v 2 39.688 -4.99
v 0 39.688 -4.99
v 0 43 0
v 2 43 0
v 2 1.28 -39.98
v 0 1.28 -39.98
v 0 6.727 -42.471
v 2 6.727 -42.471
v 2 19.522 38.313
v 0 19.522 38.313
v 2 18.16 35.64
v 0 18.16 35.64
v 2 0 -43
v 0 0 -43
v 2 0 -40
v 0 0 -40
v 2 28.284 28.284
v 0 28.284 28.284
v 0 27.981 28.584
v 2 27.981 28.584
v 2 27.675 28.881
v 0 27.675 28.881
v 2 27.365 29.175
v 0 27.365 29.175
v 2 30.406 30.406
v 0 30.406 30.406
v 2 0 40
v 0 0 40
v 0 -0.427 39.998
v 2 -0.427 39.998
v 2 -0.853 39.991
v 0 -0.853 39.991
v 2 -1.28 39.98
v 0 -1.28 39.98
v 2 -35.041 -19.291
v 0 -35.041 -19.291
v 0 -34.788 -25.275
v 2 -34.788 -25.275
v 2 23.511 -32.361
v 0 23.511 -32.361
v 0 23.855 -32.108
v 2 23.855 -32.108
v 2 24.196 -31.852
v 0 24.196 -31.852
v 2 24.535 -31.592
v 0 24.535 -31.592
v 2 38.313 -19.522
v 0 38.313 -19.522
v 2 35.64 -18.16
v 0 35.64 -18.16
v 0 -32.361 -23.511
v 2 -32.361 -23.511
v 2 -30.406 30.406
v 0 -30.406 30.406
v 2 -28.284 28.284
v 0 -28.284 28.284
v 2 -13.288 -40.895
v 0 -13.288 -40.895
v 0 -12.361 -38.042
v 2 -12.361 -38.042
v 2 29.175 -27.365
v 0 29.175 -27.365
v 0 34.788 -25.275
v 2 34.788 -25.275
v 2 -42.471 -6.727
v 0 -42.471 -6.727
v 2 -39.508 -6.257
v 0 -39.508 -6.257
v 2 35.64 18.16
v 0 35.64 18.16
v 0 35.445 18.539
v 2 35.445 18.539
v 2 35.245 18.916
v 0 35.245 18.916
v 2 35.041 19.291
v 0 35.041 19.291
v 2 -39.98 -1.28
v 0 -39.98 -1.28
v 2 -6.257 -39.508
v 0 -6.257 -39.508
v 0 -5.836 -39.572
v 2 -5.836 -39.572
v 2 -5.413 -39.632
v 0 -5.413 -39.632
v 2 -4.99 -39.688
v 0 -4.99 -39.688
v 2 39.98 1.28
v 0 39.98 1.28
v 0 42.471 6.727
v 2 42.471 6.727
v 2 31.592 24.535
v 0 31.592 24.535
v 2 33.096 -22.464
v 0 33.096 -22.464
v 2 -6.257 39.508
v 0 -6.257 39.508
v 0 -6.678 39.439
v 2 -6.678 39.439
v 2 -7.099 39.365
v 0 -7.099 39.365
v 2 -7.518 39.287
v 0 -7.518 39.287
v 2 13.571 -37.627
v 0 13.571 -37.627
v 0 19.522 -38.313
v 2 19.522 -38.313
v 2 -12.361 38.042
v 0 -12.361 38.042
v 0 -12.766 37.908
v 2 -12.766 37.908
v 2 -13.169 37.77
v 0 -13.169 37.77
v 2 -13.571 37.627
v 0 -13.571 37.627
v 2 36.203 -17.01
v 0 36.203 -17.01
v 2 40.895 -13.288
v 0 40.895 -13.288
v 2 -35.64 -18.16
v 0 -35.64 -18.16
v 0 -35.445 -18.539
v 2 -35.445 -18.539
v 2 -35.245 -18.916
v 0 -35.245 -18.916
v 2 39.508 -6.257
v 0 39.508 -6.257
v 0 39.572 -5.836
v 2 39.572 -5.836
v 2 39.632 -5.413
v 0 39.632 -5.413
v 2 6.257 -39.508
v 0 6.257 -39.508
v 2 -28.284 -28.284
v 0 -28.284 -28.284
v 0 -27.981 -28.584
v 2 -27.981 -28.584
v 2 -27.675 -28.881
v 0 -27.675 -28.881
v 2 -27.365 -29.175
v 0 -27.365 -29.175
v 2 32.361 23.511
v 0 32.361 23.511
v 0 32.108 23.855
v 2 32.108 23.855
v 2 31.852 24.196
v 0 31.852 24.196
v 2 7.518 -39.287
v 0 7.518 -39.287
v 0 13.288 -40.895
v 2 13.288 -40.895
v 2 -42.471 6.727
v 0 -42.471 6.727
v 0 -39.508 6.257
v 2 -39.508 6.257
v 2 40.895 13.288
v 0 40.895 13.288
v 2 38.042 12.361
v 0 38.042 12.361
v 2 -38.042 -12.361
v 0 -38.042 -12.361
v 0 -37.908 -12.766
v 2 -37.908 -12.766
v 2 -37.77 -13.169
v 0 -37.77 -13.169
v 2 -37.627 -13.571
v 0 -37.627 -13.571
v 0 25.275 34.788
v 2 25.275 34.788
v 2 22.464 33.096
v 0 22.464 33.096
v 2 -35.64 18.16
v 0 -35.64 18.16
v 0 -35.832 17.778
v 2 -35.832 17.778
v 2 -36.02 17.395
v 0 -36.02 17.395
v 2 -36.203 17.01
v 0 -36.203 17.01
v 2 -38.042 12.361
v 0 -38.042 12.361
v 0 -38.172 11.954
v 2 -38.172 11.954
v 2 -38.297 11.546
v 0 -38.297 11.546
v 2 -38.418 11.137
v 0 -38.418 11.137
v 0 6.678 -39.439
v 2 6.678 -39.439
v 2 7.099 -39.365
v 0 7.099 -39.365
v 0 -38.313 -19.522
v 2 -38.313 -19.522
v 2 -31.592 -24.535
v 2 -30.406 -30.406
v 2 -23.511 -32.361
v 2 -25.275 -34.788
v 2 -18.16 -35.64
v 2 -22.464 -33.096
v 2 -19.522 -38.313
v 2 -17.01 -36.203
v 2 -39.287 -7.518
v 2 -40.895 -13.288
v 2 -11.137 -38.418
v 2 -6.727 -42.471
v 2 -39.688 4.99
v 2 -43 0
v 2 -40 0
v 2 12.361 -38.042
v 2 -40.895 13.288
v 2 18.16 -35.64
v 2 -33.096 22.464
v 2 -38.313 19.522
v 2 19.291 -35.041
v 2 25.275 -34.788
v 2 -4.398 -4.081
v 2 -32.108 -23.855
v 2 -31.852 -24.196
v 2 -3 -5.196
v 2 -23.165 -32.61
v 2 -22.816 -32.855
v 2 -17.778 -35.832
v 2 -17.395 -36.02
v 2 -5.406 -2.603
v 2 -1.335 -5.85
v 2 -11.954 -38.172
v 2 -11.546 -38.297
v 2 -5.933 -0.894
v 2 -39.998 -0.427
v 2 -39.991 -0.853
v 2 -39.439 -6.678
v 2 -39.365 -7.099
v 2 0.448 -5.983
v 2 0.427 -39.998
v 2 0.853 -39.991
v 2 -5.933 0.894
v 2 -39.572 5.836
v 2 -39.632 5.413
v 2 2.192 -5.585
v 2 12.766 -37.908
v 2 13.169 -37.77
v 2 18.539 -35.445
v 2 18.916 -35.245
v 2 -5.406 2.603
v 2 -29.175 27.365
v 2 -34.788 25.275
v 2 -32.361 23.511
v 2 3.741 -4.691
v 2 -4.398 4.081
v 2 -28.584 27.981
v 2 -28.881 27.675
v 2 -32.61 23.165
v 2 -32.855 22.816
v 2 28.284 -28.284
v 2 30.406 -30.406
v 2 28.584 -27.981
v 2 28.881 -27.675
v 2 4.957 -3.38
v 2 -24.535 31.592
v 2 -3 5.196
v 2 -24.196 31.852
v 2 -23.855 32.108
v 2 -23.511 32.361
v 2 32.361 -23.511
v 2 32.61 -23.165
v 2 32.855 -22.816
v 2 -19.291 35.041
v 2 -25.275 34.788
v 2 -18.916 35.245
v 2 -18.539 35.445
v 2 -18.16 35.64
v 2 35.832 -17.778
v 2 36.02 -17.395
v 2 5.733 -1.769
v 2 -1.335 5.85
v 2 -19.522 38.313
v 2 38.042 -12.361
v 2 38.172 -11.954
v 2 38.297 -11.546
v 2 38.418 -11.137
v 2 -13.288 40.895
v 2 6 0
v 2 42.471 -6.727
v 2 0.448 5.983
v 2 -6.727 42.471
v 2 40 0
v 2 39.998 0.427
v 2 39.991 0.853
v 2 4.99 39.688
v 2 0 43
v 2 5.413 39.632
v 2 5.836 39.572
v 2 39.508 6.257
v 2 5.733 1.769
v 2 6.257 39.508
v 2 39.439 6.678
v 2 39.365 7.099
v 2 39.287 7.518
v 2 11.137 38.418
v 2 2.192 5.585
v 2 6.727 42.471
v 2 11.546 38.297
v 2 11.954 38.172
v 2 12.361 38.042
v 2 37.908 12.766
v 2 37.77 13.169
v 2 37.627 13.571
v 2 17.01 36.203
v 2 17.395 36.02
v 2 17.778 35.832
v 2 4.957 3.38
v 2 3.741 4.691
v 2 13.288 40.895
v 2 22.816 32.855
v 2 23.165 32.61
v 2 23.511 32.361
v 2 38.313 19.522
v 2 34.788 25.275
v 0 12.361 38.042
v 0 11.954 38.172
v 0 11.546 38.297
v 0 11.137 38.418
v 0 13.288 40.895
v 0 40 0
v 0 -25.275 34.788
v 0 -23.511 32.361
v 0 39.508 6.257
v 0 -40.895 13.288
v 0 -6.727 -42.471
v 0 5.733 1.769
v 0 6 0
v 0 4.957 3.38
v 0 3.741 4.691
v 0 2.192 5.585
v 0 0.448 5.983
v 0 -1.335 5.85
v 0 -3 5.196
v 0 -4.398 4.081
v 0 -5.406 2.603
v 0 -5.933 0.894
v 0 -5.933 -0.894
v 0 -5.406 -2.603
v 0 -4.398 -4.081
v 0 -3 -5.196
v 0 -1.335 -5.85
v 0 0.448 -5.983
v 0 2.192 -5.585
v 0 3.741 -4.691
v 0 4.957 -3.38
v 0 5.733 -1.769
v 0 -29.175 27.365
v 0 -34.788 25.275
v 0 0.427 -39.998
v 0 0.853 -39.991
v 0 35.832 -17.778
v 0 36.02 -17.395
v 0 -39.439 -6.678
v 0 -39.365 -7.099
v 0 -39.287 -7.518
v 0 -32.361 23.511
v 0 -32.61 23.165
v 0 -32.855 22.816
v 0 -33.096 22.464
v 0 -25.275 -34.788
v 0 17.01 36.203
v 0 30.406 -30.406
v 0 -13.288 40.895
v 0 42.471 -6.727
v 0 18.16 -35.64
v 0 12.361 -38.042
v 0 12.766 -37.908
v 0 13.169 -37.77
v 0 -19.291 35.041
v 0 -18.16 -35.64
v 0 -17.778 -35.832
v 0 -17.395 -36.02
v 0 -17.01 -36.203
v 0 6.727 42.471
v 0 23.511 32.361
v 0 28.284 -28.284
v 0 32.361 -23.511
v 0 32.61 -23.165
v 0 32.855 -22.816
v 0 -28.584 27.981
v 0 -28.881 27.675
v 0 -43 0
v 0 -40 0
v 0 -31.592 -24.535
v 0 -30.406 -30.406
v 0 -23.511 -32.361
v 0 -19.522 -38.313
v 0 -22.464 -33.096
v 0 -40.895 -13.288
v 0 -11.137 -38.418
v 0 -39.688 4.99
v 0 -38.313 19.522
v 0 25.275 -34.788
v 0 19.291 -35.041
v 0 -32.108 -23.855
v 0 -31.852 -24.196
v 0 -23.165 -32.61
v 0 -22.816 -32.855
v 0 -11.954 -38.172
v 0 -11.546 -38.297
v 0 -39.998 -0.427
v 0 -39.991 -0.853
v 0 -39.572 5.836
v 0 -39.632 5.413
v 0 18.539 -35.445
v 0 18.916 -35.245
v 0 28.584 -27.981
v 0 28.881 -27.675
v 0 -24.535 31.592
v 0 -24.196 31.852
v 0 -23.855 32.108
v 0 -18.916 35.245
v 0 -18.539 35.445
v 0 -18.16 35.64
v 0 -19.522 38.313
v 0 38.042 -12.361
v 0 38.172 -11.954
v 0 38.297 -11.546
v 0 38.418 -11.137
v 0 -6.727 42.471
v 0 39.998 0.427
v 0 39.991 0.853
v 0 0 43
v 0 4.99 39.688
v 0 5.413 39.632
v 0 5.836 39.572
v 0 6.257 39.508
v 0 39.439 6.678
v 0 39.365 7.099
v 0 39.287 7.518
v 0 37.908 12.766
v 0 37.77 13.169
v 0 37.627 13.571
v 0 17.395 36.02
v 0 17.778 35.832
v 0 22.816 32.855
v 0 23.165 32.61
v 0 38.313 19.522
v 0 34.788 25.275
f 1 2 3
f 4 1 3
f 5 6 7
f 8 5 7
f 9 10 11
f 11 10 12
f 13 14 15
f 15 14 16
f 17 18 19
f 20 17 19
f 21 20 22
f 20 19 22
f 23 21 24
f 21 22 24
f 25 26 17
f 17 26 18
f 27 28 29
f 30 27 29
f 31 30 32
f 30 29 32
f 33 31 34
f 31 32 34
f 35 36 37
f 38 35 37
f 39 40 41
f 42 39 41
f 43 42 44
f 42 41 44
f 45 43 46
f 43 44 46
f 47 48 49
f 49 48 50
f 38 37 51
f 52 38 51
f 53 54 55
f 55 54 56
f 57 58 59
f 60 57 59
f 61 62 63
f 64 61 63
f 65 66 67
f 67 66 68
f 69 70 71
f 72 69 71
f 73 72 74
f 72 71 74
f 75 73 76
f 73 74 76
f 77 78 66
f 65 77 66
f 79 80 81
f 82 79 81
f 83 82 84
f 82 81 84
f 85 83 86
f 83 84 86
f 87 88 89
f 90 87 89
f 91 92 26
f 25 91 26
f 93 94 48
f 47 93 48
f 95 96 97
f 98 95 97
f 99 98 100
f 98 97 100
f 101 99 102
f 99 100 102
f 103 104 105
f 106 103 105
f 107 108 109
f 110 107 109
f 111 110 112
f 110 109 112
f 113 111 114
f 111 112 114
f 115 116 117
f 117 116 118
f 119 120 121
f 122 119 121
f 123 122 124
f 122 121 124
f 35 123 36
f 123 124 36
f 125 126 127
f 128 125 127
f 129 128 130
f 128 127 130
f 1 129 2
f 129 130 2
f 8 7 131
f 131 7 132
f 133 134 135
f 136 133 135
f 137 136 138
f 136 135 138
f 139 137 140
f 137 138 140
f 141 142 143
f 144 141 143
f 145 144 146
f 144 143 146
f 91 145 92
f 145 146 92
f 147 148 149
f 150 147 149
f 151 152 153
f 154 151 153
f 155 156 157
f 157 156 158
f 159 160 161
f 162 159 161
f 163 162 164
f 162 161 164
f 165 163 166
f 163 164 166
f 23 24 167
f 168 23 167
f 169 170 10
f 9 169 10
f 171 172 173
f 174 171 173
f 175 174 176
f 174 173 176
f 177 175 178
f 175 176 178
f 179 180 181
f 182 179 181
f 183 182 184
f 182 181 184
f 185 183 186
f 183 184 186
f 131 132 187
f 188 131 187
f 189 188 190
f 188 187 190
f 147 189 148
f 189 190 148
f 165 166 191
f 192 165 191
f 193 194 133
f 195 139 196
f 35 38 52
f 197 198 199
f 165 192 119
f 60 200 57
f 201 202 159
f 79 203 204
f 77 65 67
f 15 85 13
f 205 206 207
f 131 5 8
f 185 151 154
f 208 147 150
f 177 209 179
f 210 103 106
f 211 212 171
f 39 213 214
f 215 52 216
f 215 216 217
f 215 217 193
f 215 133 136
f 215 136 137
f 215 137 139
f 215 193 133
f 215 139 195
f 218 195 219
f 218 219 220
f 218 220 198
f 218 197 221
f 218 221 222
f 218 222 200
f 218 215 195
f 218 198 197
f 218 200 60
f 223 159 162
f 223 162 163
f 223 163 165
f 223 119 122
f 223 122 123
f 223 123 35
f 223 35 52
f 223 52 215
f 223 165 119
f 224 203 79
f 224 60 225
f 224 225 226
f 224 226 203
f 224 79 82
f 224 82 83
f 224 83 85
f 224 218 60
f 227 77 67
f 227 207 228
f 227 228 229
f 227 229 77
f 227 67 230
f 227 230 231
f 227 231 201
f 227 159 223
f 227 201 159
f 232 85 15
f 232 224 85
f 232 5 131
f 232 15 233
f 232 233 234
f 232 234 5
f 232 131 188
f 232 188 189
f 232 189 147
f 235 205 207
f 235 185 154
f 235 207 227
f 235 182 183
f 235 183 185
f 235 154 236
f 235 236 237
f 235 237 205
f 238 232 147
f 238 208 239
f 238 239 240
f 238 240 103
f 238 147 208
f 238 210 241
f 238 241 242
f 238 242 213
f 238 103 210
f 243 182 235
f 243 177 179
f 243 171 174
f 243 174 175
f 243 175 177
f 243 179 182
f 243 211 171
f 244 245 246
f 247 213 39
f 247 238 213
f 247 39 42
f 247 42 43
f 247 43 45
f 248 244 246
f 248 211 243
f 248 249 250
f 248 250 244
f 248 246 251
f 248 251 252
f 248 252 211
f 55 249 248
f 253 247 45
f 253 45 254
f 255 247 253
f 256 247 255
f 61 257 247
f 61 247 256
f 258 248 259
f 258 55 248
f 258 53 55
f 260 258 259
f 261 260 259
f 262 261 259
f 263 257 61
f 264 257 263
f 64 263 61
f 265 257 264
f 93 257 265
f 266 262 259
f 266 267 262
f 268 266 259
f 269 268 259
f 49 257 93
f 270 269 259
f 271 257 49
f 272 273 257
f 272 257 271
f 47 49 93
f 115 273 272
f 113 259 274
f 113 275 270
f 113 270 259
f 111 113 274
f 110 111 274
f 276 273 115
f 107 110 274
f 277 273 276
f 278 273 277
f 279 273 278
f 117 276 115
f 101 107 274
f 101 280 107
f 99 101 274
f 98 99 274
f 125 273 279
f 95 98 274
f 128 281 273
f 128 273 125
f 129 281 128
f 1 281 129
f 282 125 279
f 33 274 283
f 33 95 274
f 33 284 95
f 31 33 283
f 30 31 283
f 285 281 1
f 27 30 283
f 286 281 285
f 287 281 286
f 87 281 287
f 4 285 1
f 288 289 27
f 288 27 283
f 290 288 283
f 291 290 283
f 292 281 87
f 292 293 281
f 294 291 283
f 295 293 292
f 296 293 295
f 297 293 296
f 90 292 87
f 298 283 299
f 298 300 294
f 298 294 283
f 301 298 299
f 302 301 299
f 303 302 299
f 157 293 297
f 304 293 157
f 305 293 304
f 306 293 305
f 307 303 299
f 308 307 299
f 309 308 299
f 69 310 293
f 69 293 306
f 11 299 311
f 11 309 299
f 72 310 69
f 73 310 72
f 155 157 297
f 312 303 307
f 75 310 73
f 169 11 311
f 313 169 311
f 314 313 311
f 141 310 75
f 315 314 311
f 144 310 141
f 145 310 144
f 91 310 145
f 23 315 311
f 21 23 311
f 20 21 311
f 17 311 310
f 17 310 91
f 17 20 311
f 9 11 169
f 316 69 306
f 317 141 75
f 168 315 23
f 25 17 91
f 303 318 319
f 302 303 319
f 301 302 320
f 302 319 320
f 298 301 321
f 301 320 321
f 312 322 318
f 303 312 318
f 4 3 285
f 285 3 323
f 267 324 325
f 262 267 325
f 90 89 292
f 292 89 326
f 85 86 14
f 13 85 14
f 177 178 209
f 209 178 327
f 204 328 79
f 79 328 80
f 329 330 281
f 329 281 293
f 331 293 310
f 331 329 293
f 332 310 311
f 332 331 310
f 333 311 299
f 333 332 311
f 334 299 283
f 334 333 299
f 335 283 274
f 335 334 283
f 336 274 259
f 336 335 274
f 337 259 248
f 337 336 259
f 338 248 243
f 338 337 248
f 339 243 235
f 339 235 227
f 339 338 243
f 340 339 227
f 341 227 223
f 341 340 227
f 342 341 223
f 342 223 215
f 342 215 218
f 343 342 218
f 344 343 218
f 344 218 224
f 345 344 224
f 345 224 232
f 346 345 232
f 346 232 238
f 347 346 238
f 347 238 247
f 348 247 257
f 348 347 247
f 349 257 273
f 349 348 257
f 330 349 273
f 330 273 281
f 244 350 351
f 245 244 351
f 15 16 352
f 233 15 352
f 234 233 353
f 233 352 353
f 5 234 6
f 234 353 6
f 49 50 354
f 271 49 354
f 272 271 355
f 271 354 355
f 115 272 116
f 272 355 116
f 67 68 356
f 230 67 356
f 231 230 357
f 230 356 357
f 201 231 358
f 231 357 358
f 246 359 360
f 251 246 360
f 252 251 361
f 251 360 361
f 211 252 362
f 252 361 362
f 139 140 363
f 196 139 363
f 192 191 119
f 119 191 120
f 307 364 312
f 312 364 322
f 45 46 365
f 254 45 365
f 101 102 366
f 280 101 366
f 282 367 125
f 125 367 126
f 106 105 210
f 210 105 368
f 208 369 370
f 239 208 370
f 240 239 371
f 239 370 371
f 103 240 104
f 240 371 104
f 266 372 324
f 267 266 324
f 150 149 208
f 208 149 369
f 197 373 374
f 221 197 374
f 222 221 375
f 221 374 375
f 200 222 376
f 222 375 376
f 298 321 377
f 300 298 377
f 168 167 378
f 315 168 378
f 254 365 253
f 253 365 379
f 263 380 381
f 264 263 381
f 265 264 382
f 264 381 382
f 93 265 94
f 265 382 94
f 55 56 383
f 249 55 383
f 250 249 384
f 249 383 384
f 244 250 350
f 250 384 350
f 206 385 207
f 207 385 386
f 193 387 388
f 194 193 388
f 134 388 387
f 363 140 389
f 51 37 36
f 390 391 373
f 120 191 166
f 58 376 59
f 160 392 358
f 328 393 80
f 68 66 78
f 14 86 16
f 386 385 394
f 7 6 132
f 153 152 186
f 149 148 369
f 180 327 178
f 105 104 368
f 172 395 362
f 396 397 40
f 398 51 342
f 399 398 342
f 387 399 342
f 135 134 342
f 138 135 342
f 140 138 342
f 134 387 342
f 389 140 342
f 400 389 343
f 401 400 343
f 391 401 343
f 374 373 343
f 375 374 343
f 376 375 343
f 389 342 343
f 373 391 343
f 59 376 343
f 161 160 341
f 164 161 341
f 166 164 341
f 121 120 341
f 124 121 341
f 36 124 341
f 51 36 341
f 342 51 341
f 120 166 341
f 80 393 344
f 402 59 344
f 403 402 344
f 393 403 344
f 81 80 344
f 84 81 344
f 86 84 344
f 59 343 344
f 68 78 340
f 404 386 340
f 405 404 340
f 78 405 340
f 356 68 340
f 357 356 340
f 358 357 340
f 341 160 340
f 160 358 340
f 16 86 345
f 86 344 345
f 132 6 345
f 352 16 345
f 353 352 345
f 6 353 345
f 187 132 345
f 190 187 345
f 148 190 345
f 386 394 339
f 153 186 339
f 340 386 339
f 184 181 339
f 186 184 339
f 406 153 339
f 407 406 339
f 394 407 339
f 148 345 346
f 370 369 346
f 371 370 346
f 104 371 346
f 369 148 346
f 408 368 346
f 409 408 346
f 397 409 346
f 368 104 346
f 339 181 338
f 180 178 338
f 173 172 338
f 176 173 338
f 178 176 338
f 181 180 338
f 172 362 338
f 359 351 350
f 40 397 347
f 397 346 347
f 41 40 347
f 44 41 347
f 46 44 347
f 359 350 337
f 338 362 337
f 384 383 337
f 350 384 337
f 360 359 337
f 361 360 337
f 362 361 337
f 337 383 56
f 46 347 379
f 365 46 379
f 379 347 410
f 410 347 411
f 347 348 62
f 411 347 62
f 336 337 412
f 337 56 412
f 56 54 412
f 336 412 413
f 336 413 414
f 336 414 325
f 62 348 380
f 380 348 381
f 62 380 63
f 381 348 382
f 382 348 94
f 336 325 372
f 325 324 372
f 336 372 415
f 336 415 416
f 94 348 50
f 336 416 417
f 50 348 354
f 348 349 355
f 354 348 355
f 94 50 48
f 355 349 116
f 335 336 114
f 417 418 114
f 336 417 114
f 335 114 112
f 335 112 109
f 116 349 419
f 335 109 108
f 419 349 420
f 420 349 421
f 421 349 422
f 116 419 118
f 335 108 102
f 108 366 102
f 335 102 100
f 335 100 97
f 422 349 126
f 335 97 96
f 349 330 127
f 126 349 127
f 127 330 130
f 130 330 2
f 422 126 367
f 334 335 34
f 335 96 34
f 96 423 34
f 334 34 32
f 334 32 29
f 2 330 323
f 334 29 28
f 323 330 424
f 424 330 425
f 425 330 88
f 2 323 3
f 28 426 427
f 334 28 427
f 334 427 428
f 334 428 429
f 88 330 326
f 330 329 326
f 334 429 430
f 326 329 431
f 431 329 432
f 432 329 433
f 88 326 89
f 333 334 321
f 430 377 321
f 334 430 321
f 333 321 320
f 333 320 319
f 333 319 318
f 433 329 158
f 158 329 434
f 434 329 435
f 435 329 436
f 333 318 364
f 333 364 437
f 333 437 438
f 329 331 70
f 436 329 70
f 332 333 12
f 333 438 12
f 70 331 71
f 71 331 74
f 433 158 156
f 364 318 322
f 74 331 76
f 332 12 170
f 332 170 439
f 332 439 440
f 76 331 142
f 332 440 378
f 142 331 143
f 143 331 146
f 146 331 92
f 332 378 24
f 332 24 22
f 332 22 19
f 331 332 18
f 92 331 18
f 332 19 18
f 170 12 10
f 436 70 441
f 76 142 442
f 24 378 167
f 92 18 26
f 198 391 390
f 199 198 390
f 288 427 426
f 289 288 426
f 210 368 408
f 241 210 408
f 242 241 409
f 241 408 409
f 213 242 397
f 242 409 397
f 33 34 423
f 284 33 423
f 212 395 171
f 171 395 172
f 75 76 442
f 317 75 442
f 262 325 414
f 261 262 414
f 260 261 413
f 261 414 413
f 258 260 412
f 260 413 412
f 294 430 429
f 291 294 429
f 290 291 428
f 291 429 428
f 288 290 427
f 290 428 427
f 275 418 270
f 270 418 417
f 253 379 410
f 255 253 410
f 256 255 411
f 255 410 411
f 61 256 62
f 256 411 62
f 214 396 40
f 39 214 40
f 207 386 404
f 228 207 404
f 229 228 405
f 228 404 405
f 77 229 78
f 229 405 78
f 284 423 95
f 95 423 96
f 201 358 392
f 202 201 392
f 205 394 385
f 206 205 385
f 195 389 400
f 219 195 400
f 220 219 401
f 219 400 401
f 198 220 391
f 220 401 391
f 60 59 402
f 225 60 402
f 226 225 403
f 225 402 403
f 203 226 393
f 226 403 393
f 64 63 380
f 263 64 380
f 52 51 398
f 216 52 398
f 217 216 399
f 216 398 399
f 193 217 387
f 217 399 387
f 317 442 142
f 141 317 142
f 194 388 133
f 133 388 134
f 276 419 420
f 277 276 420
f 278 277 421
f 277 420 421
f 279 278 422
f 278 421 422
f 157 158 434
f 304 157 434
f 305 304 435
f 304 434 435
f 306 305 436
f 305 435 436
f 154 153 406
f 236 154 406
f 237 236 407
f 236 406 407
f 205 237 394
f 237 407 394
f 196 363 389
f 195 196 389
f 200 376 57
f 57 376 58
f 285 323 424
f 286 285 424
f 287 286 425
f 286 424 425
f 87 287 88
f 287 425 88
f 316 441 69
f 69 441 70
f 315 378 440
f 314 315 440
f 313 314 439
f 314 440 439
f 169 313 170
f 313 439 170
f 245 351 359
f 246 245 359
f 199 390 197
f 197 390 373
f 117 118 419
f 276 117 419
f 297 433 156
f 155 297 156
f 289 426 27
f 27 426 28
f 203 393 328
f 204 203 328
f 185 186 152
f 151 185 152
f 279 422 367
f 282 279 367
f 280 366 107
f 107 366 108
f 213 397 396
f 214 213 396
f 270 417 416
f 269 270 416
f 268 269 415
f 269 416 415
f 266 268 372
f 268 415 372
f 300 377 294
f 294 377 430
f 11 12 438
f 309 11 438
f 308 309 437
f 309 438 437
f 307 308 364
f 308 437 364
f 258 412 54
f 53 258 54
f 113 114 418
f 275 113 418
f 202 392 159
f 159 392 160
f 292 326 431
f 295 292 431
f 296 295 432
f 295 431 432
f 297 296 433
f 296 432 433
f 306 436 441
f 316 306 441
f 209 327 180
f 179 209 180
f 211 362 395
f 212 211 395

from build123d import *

# Parameters (mm, degrees)
F0_R     = 6
F1_DEPTH = 2


with BuildPart() as f1:
    # F0 (on Right) → F1 (new body)
    with BuildSketch(Plane.YZ):
        with BuildLine():
            ThreePointArc((39.6875, -4.990225), (39.921799, -2.5), (40, 0))
            ThreePointArc((40, 0), (39.994881, 0.639935), (39.979524, 1.279706))
            ThreePointArc((39.979524, 1.279706), (39.821381, 3.775924), (39.507534, 6.257379))
            ThreePointArc((39.507534, 6.257379), (39.402369, 6.888634), (39.28712, 7.518126))
            ThreePointArc((39.28712, 7.518126), (38.740429, 9.958873), (38.042261, 12.36068))
            ThreePointArc((38.042261, 12.36068), (37.839641, 12.967712), (37.627336, 13.571425))
            ThreePointArc((37.627336, 13.571425), (36.705559, 15.896601), (35.640261, 18.15962))
            ThreePointArc((35.640261, 18.15962), (35.345175, 18.727482), (35.041043, 19.290551))
            ThreePointArc((35.041043, 19.290551), (33.766877, 21.442902), (32.36068, 23.51141))
            ThreePointArc((32.36068, 23.51141), (31.980394, 24.026119), (31.591922, 24.534679))
            ThreePointArc((31.591922, 24.534679), (29.996741, 26.461208), (28.284271, 28.284271))
            ThreePointArc((28.284271, 28.284271), (27.828149, 28.733154), (27.364904, 29.174681))
            ThreePointArc((27.364904, 29.174681), (25.487987, 30.82795), (23.51141, 32.36068))
            ThreePointArc((23.51141, 32.36068), (22.990683, 32.732682), (22.464071, 33.096307))
            ThreePointArc((22.464071, 33.096307), (20.351634, 34.435607), (18.15962, 35.640261))
            ThreePointArc((18.15962, 35.640261), (17.58711, 35.926224), (17.010098, 36.202991))
            ThreePointArc((17.010098, 36.202991), (14.714155, 37.195344), (12.36068, 38.042261))
            ThreePointArc((12.36068, 38.042261), (11.750484, 38.235143), (11.13728, 38.418238))
            ThreePointArc((11.13728, 38.418238), (8.714366, 39.039209), (6.257379, 39.507534))
            ThreePointArc((6.257379, 39.507534), (5.624522, 39.602585), (4.990225, 39.6875))
            ThreePointArc((4.990225, 39.6875), (2.5, 39.921799), (0, 40))
            ThreePointArc((0, 40), (-0.639935, 39.994881), (-1.279706, 39.979524))
            ThreePointArc((-1.279706, 39.979524), (-3.775924, 39.821381), (-6.257379, 39.507534))
            ThreePointArc((-6.257379, 39.507534), (-6.888634, 39.402369), (-7.518126, 39.28712))
            ThreePointArc((-7.518126, 39.28712), (-9.958873, 38.740429), (-12.36068, 38.042261))
            ThreePointArc((-12.36068, 38.042261), (-12.967712, 37.839641), (-13.571425, 37.627336))
            ThreePointArc((-13.571425, 37.627336), (-15.896601, 36.705559), (-18.15962, 35.640261))
            ThreePointArc((-18.15962, 35.640261), (-18.727482, 35.345175), (-19.290551, 35.041043))
            ThreePointArc((-19.290551, 35.041043), (-21.442902, 33.766877), (-23.51141, 32.36068))
            ThreePointArc((-23.51141, 32.36068), (-24.026119, 31.980394), (-24.534679, 31.591922))
            ThreePointArc((-24.534679, 31.591922), (-26.461208, 29.996741), (-28.284271, 28.284271))
            ThreePointArc((-28.284271, 28.284271), (-28.733154, 27.828149), (-29.174681, 27.364904))
            ThreePointArc((-29.174681, 27.364904), (-30.82795, 25.487987), (-32.36068, 23.51141))
            ThreePointArc((-32.36068, 23.51141), (-32.732682, 22.990683), (-33.096307, 22.464071))
            ThreePointArc((-33.096307, 22.464071), (-34.435607, 20.351634), (-35.640261, 18.15962))
            ThreePointArc((-35.640261, 18.15962), (-35.926224, 17.58711), (-36.202991, 17.010098))
            ThreePointArc((-36.202991, 17.010098), (-37.195344, 14.714155), (-38.042261, 12.36068))
            ThreePointArc((-38.042261, 12.36068), (-38.235143, 11.750484), (-38.418238, 11.13728))
            ThreePointArc((-38.418238, 11.13728), (-39.039209, 8.714366), (-39.507534, 6.257379))
            ThreePointArc((-39.507534, 6.257379), (-39.602585, 5.624522), (-39.6875, 4.990225))
            ThreePointArc((-39.6875, 4.990225), (-39.921799, 2.5), (-40, 0))
            ThreePointArc((-40, 0), (-39.994881, -0.639935), (-39.979524, -1.279706))
            ThreePointArc((-39.979524, -1.279706), (-39.821381, -3.775924), (-39.507534, -6.257379))
            ThreePointArc((-39.507534, -6.257379), (-39.402369, -6.888634), (-39.28712, -7.518126))
            ThreePointArc((-39.28712, -7.518126), (-38.740429, -9.958873), (-38.042261, -12.36068))
            ThreePointArc((-38.042261, -12.36068), (-37.839641, -12.967712), (-37.627336, -13.571425))
            ThreePointArc((-37.627336, -13.571425), (-36.705559, -15.896601), (-35.640261, -18.15962))
            ThreePointArc((-35.640261, -18.15962), (-35.345175, -18.727482), (-35.041043, -19.290551))
            ThreePointArc((-35.041043, -19.290551), (-33.766877, -21.442902), (-32.36068, -23.51141))
            ThreePointArc((-32.36068, -23.51141), (-31.980394, -24.026119), (-31.591922, -24.534679))
            ThreePointArc((-31.591922, -24.534679), (-29.996741, -26.461208), (-28.284271, -28.284271))
            ThreePointArc((-28.284271, -28.284271), (-27.828149, -28.733154), (-27.364904, -29.174681))
            ThreePointArc((-27.364904, -29.174681), (-25.487987, -30.82795), (-23.51141, -32.36068))
            ThreePointArc((-23.51141, -32.36068), (-22.990683, -32.732682), (-22.464071, -33.096307))
            ThreePointArc((-22.464071, -33.096307), (-20.351634, -34.435607), (-18.15962, -35.640261))
            ThreePointArc((-18.15962, -35.640261), (-17.58711, -35.926224), (-17.010098, -36.202991))
            ThreePointArc((-17.010098, -36.202991), (-14.714155, -37.195344), (-12.36068, -38.042261))
            ThreePointArc((-12.36068, -38.042261), (-11.750484, -38.235143), (-11.13728, -38.418238))
            ThreePointArc((-11.13728, -38.418238), (-8.714366, -39.039209), (-6.257379, -39.507534))
            ThreePointArc((-6.257379, -39.507534), (-5.624522, -39.602585), (-4.990225, -39.6875))
            ThreePointArc((-4.990225, -39.6875), (-2.5, -39.921799), (0, -40))
            ThreePointArc((0, -40), (0.639935, -39.994881), (1.279706, -39.979524))
            ThreePointArc((1.279706, -39.979524), (3.775924, -39.821381), (6.257379, -39.507534))
            ThreePointArc((6.257379, -39.507534), (6.888634, -39.402369), (7.518126, -39.28712))
            ThreePointArc((7.518126, -39.28712), (9.958873, -38.740429), (12.36068, -38.042261))
            ThreePointArc((12.36068, -38.042261), (12.967712, -37.839641), (13.571425, -37.627336))
            ThreePointArc((13.571425, -37.627336), (15.896601, -36.705559), (18.15962, -35.640261))
            ThreePointArc((18.15962, -35.640261), (18.727482, -35.345175), (19.290551, -35.041043))
            ThreePointArc((19.290551, -35.041043), (21.442902, -33.766877), (23.51141, -32.36068))
            ThreePointArc((23.51141, -32.36068), (24.026119, -31.980394), (24.534679, -31.591922))
            ThreePointArc((24.534679, -31.591922), (26.461208, -29.996741), (28.284271, -28.284271))
            ThreePointArc((28.284271, -28.284271), (28.733154, -27.828149), (29.174681, -27.364904))
            ThreePointArc((29.174681, -27.364904), (30.82795, -25.487987), (32.36068, -23.51141))
            ThreePointArc((32.36068, -23.51141), (32.732682, -22.990683), (33.096307, -22.464071))
            ThreePointArc((33.096307, -22.464071), (34.435607, -20.351634), (35.640261, -18.15962))
            ThreePointArc((35.640261, -18.15962), (35.926224, -17.58711), (36.202991, -17.010098))
            ThreePointArc((36.202991, -17.010098), (37.195344, -14.714155), (38.042261, -12.36068))
            ThreePointArc((38.042261, -12.36068), (38.235143, -11.750484), (38.418238, -11.13728))
            ThreePointArc((38.418238, -11.13728), (39.039209, -8.714366), (39.507534, -6.257379))
            ThreePointArc((39.507534, -6.257379), (39.602585, -5.624522), (39.6875, -4.990225))
        make_face()
        Circle(F0_R, mode=Mode.SUBTRACT)
        with BuildLine():
            Line((-19.521591, -38.313281), (-18.15962, -35.640261))
            ThreePointArc((-18.15962, -35.640261), (-20.351634, -34.435607), (-22.464071, -33.096307))
            Line((-22.464071, -33.096307), (-19.521591, -38.313281))
        make_face()
        with BuildLine():
            ThreePointArc((-40, 0), (-39.921799, 2.5), (-39.6875, 4.990225))
            Line((-39.6875, 4.990225), (-43, 0))
            Line((-43, 0), (-40, 0))
        make_face()
        with BuildLine():
            Line((34.787731, -25.274766), (32.36068, -23.51141))
            ThreePointArc((32.36068, -23.51141), (30.82795, -25.487987), (29.174681, -27.364904))
            Line((29.174681, -27.364904), (34.787731, -25.274766))
        make_face()
        with BuildLine():
            Line((-42.470599, -6.726682), (-39.507534, -6.257379))
            ThreePointArc((-39.507534, -6.257379), (-39.821381, -3.775924), (-39.979524, -1.279706))
            Line((-39.979524, -1.279706), (-42.470599, -6.726682))
        make_face()
        with BuildLine():
            Line((0, -43), (0, -40))
            ThreePointArc((0, -40), (-2.5, -39.921799), (-4.990225, -39.6875))
            Line((-4.990225, -39.6875), (0, -43))
        make_face()
        with BuildLine():
            Line((38.313281, -19.521591), (35.640261, -18.15962))
            ThreePointArc((35.640261, -18.15962), (34.435607, -20.351634), (33.096307, -22.464071))
            Line((33.096307, -22.464071), (38.313281, -19.521591))
        make_face()
        with BuildLine():
            Line((-13.287731, -40.89543), (-12.36068, -38.042261))
            ThreePointArc((-12.36068, -38.042261), (-14.714155, -37.195344), (-17.010098, -36.202991))
            Line((-17.010098, -36.202991), (-13.287731, -40.89543))
        make_face()
        with BuildLine():
            Line((-40.89543, -13.287731), (-38.042261, -12.36068))
            ThreePointArc((-38.042261, -12.36068), (-38.740429, -9.958873), (-39.28712, -7.518126))
            Line((-39.28712, -7.518126), (-40.89543, -13.287731))
        make_face()
        with BuildLine():
            Line((40.89543, -13.287731), (38.042261, -12.36068))
            ThreePointArc((38.042261, -12.36068), (37.195344, -14.714155), (36.202991, -17.010098))
            Line((36.202991, -17.010098), (40.89543, -13.287731))
        make_face()
        with BuildLine():
            Line((6.726682, -42.470599), (6.257379, -39.507534))
            ThreePointArc((6.257379, -39.507534), (3.775924, -39.821381), (1.279706, -39.979524))
            Line((1.279706, -39.979524), (6.726682, -42.470599))
        make_face()
        with BuildLine():
            Line((-6.726682, -42.470599), (-6.257379, -39.507534))
            ThreePointArc((-6.257379, -39.507534), (-8.714366, -39.039209), (-11.13728, -38.418238))
            Line((-11.13728, -38.418238), (-6.726682, -42.470599))
        make_face()
        with BuildLine():
            Line((42.470599, -6.726682), (39.507534, -6.257379))
            ThreePointArc((39.507534, -6.257379), (39.039209, -8.714366), (38.418238, -11.13728))
            Line((38.418238, -11.13728), (42.470599, -6.726682))
        make_face()
        with BuildLine():
            Line((-38.313281, -19.521591), (-35.640261, -18.15962))
            ThreePointArc((-35.640261, -18.15962), (-36.705559, -15.896601), (-37.627336, -13.571425))
            Line((-37.627336, -13.571425), (-38.313281, -19.521591))
        make_face()
        with BuildLine():
            ThreePointArc((-32.36068, 23.51141), (-30.82795, 25.487987), (-29.174681, 27.364904))
            Line((-29.174681, 27.364904), (-34.787731, 25.274766))
            Line((-34.787731, 25.274766), (-32.36068, 23.51141))
        make_face()
        with BuildLine():
            ThreePointArc((-23.51141, 32.36068), (-21.442902, 33.766877), (-19.290551, 35.041043))
            Line((-19.290551, 35.041043), (-25.274766, 34.787731))
            Line((-25.274766, 34.787731), (-23.51141, 32.36068))
        make_face()
        with BuildLine():
            ThreePointArc((-28.284271, 28.284271), (-26.461208, 29.996741), (-24.534679, 31.591922))
            Line((-24.534679, 31.591922), (-30.405592, 30.405592))
            Line((-30.405592, 30.405592), (-28.284271, 28.284271))
        make_face()
        with BuildLine():
            ThreePointArc((-35.640261, 18.15962), (-34.435607, 20.351634), (-33.096307, 22.464071))
            Line((-33.096307, 22.464071), (-38.313281, 19.521591))
            Line((-38.313281, 19.521591), (-35.640261, 18.15962))
        make_face()
        with BuildLine():
            Line((19.521591, -38.313281), (18.15962, -35.640261))
            ThreePointArc((18.15962, -35.640261), (15.896601, -36.705559), (13.571425, -37.627336))
            Line((13.571425, -37.627336), (19.521591, -38.313281))
        make_face()
        with BuildLine():
            ThreePointArc((39.507534, 6.257379), (39.821381, 3.775924), (39.979524, 1.279706))
            Line((39.979524, 1.279706), (42.470599, 6.726682))
            Line((42.470599, 6.726682), (39.507534, 6.257379))
        make_face()
        with BuildLine():
            ThreePointArc((38.042261, 12.36068), (38.740429, 9.958873), (39.28712, 7.518126))
            Line((39.28712, 7.518126), (40.89543, 13.287731))
            Line((40.89543, 13.287731), (38.042261, 12.36068))
        make_face()
        with BuildLine():
            ThreePointArc((35.640261, 18.15962), (36.705559, 15.896601), (37.627336, 13.571425))
            Line((37.627336, 13.571425), (38.313281, 19.521591))
            Line((38.313281, 19.521591), (35.640261, 18.15962))
        make_face()
        with BuildLine():
            ThreePointArc((32.36068, 23.51141), (33.766877, 21.442902), (35.041043, 19.290551))
            Line((35.041043, 19.290551), (34.787731, 25.274766))
            Line((34.787731, 25.274766), (32.36068, 23.51141))
        make_face()
        with BuildLine():
            ThreePointArc((28.284271, 28.284271), (29.996741, 26.461208), (31.591922, 24.534679))
            Line((31.591922, 24.534679), (30.405592, 30.405592))
            Line((30.405592, 30.405592), (28.284271, 28.284271))
        make_face()
        with BuildLine():
            ThreePointArc((23.51141, 32.36068), (25.487987, 30.82795), (27.364904, 29.174681))
            Line((27.364904, 29.174681), (25.274766, 34.787731))
            Line((25.274766, 34.787731), (23.51141, 32.36068))
        make_face()
        with BuildLine():
            ThreePointArc((18.15962, 35.640261), (20.351634, 34.435607), (22.464071, 33.096307))
            Line((22.464071, 33.096307), (19.521591, 38.313281))
            Line((19.521591, 38.313281), (18.15962, 35.640261))
        make_face()
        with BuildLine():
            ThreePointArc((12.36068, 38.042261), (14.714155, 37.195344), (17.010098, 36.202991))
            Line((17.010098, 36.202991), (13.287731, 40.89543))
            Line((13.287731, 40.89543), (12.36068, 38.042261))
        make_face()
        with BuildLine():
            ThreePointArc((6.257379, 39.507534), (8.714366, 39.039209), (11.13728, 38.418238))
            Line((11.13728, 38.418238), (6.726682, 42.470599))
            Line((6.726682, 42.470599), (6.257379, 39.507534))
        make_face()
        with BuildLine():
            ThreePointArc((0, 40), (2.5, 39.921799), (4.990225, 39.6875))
            Line((4.990225, 39.6875), (0, 43))
            Line((0, 43), (0, 40))
        make_face()
        with BuildLine():
            ThreePointArc((-6.257379, 39.507534), (-3.775924, 39.821381), (-1.279706, 39.979524))
            Line((-1.279706, 39.979524), (-6.726682, 42.470599))
            Line((-6.726682, 42.470599), (-6.257379, 39.507534))
        make_face()
        with BuildLine():
            ThreePointArc((-12.36068, 38.042261), (-9.958873, 38.740429), (-7.518126, 39.28712))
            Line((-7.518126, 39.28712), (-13.287731, 40.89543))
            Line((-13.287731, 40.89543), (-12.36068, 38.042261))
        make_face()
        with BuildLine():
            ThreePointArc((-18.15962, 35.640261), (-15.896601, 36.705559), (-13.571425, 37.627336))
            Line((-13.571425, 37.627336), (-19.521591, 38.313281))
            Line((-19.521591, 38.313281), (-18.15962, 35.640261))
        make_face()
        with BuildLine():
            Line((43, 0), (40, 0))
            ThreePointArc((40, 0), (39.921799, -2.5), (39.6875, -4.990225))
            Line((39.6875, -4.990225), (43, 0))
        make_face()
        with BuildLine():
            Line((-34.787731, -25.274766), (-32.36068, -23.51141))
            ThreePointArc((-32.36068, -23.51141), (-33.766877, -21.442902), (-35.041043, -19.290551))
            Line((-35.041043, -19.290551), (-34.787731, -25.274766))
        make_face()
        with BuildLine():
            ThreePointArc((-38.042261, 12.36068), (-37.195344, 14.714155), (-36.202991, 17.010098))
            Line((-36.202991, 17.010098), (-40.89543, 13.287731))
            Line((-40.89543, 13.287731), (-38.042261, 12.36068))
        make_face()
        with BuildLine():
            Line((25.274766, -34.787731), (23.51141, -32.36068))
            ThreePointArc((23.51141, -32.36068), (21.442902, -33.766877), (19.290551, -35.041043))
            Line((19.290551, -35.041043), (25.274766, -34.787731))
        make_face()
        with BuildLine():
            Line((-30.405592, -30.405592), (-28.284271, -28.284271))
            ThreePointArc((-28.284271, -28.284271), (-29.996741, -26.461208), (-31.591922, -24.534679))
            Line((-31.591922, -24.534679), (-30.405592, -30.405592))
        make_face()
        with BuildLine():
            ThreePointArc((-39.507534, 6.257379), (-39.039209, 8.714366), (-38.418238, 11.13728))
            Line((-38.418238, 11.13728), (-42.470599, 6.726682))
            Line((-42.470599, 6.726682), (-39.507534, 6.257379))
        make_face()
        with BuildLine():
            Line((30.405592, -30.405592), (28.284271, -28.284271))
            ThreePointArc((28.284271, -28.284271), (26.461208, -29.996741), (24.534679, -31.591922))
            Line((24.534679, -31.591922), (30.405592, -30.405592))
        make_face()
        with BuildLine():
            Line((13.287731, -40.89543), (12.36068, -38.042261))
            ThreePointArc((12.36068, -38.042261), (9.958873, -38.740429), (7.518126, -39.28712))
            Line((7.518126, -39.28712), (13.287731, -40.89543))
        make_face()
        with BuildLine():
            Line((-25.274766, -34.787731), (-23.51141, -32.36068))
            ThreePointArc((-23.51141, -32.36068), (-25.487987, -30.82795), (-27.364904, -29.174681))
            Line((-27.364904, -29.174681), (-25.274766, -34.787731))
        make_face()
    extrude(amount=F1_DEPTH)


solid = f1.part
